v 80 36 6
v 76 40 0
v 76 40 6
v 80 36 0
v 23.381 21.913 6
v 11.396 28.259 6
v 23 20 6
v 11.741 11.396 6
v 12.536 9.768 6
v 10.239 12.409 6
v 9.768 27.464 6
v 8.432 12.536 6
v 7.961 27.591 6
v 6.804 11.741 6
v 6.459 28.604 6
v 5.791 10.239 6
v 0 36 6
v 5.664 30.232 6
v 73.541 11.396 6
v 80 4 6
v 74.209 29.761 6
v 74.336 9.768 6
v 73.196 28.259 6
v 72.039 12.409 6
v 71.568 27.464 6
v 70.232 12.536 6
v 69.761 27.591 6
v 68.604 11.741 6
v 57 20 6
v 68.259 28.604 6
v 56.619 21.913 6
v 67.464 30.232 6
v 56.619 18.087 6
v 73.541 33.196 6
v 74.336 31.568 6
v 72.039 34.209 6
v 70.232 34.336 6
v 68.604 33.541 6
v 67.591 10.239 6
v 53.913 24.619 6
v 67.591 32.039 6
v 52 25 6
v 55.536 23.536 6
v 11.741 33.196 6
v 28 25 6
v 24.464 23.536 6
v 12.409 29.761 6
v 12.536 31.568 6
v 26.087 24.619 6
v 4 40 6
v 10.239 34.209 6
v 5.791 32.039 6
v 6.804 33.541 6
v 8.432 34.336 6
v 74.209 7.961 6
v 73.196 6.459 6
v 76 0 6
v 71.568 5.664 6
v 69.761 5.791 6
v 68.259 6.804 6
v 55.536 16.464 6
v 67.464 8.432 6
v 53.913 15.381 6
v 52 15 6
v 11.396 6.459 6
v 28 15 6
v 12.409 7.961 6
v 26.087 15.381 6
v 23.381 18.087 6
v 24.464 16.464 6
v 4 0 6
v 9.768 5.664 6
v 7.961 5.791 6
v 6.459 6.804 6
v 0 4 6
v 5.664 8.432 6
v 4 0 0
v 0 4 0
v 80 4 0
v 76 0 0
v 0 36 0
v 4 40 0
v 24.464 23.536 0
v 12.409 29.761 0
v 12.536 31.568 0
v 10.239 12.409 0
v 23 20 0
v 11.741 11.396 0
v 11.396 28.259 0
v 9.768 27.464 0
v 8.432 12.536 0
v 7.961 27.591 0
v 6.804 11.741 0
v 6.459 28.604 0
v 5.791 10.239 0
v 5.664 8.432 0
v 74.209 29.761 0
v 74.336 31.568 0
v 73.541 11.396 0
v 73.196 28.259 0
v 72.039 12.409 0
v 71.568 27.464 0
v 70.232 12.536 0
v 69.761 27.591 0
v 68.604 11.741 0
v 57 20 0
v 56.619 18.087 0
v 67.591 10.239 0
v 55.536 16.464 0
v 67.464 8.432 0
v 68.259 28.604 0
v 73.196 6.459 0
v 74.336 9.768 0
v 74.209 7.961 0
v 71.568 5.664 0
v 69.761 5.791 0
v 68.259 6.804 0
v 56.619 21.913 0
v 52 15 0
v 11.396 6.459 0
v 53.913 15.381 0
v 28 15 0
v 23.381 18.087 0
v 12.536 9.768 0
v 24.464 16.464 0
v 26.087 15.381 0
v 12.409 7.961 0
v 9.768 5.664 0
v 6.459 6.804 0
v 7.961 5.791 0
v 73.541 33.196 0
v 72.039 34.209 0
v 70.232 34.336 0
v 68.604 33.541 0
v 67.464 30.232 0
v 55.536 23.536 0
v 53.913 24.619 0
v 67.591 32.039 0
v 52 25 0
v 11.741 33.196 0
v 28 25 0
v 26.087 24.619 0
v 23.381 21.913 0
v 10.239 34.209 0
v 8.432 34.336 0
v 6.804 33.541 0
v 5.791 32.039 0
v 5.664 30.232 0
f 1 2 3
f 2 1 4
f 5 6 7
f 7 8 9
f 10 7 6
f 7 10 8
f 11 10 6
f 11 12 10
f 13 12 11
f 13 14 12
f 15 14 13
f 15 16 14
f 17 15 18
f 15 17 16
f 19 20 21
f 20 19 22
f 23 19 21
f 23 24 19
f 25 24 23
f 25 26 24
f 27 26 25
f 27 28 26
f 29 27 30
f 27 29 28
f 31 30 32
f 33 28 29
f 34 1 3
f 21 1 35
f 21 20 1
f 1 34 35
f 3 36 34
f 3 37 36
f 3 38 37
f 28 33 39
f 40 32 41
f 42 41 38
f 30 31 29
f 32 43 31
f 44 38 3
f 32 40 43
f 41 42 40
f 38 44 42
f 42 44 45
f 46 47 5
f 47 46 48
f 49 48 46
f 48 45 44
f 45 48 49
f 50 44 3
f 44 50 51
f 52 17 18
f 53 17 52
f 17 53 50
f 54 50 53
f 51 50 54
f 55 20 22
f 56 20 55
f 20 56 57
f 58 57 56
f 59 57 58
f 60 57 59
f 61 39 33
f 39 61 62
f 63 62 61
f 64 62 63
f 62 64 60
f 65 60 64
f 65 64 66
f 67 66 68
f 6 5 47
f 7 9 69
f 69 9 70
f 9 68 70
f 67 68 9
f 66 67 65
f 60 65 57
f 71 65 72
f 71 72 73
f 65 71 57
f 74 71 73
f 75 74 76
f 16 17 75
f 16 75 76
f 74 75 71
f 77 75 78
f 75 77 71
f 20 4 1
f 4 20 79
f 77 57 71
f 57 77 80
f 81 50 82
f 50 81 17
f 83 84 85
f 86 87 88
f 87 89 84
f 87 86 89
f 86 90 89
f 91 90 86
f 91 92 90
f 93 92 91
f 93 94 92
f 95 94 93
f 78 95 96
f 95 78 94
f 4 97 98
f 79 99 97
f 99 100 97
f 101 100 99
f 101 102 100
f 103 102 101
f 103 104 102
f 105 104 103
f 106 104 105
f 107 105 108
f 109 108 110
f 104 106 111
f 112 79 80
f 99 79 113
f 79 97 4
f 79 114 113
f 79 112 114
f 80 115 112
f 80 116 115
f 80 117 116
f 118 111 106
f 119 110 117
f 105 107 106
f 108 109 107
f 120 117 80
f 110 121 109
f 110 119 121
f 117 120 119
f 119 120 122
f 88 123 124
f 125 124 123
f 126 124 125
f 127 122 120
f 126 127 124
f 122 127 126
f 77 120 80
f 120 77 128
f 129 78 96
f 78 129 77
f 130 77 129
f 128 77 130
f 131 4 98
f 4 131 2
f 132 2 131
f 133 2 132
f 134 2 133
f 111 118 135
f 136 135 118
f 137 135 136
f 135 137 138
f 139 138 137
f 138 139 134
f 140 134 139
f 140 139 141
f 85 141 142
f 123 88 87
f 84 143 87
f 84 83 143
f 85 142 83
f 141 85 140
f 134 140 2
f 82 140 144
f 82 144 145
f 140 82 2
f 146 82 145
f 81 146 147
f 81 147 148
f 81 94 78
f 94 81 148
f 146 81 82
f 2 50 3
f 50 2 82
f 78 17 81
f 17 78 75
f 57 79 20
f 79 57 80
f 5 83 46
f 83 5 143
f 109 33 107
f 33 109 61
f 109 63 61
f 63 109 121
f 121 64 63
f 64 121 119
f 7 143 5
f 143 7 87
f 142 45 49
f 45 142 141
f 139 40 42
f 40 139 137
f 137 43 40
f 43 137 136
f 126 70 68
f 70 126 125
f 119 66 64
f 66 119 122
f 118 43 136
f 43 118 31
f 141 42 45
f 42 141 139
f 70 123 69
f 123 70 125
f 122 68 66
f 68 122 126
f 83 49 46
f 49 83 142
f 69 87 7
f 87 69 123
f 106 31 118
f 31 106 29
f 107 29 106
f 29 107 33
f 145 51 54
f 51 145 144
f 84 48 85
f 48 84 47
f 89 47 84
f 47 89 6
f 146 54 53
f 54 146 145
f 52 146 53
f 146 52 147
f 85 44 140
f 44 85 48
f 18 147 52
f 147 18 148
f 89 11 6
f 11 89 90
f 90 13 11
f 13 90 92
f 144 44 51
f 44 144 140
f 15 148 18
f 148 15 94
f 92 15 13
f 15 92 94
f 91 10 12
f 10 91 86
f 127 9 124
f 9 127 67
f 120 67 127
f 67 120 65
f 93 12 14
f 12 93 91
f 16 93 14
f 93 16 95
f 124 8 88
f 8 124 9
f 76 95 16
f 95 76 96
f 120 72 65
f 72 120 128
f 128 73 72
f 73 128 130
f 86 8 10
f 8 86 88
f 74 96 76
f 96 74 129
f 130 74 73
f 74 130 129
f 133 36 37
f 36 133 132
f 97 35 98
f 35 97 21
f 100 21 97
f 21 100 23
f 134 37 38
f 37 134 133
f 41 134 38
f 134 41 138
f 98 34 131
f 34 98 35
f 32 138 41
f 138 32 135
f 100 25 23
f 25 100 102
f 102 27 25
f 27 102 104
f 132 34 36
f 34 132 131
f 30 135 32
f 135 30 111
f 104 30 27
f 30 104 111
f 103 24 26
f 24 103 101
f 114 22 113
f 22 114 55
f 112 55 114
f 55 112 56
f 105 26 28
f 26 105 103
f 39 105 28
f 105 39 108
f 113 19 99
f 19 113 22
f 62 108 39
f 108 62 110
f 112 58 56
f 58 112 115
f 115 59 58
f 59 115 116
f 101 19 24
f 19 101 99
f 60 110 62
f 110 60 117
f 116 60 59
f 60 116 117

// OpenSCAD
$fn = 32;

// ----------------------------------------------------------------------
// Bracket plate: slot plate 80 x 40
// ----------------------------------------------------------------------

// --- parameters (mm) ---
hole_r = 3.5;             // bolt hole radius
plate_t = 6;              // plate thickness, Z (extrusion height)
plate_l = 80;             // plate length
plate_w = 40;             // plate width
slot_l = 24;              // slot straight length
slot_r = 5;               // slot end radius
fit_tol = 0.05;           // declared fit tolerance (prompt contract)
free_tol = 0.3;           // declared free tolerance (prompt contract)

slot_len = slot_l + 2 * slot_r;
slot_w = 2 * slot_r;
hole_d2 = 2 * hole_r;

profile = [[4, 0], [76, 0], [80, 4], [80, 36], [76, 40], [4, 40], [0, 36], [0, 4]];  // primary outline, 8 points, counter clockwise
void_1 = [[52, 15], [53.913, 15.381], [55.536, 16.464], [56.619, 18.087], [57, 20], [56.619, 21.913], [55.536, 23.536], [53.913, 24.619], [52, 25], [28, 25], [26.087, 24.619], [24.464, 23.536], [23.381, 21.913], [23, 20], [23.381, 18.087], [24.464, 16.464], [26.087, 15.381], [28, 15]];  // grip slot, 18 points
void_2 = [[12.536, 31.568], [11.741, 33.196], [10.239, 34.209], [8.432, 34.336], [6.804, 33.541], [5.791, 32.039], [5.664, 30.232], [6.459, 28.604], [7.961, 27.591], [9.768, 27.464], [11.396, 28.259], [12.409, 29.761]];  // corner hole, 12 points
void_3 = [[12.536, 9.768], [11.741, 11.396], [10.239, 12.409], [8.432, 12.536], [6.804, 11.741], [5.791, 10.239], [5.664, 8.432], [6.459, 6.804], [7.961, 5.791], [9.768, 5.664], [11.396, 6.459], [12.409, 7.961]];  // corner hole, 12 points
void_4 = [[74.336, 31.568], [73.541, 33.196], [72.039, 34.209], [70.232, 34.336], [68.604, 33.541], [67.591, 32.039], [67.464, 30.232], [68.259, 28.604], [69.761, 27.591], [71.568, 27.464], [73.196, 28.259], [74.209, 29.761]];  // corner hole, 12 points
void_5 = [[74.336, 9.768], [73.541, 11.396], [72.039, 12.409], [70.232, 12.536], [68.604, 11.741], [67.591, 10.239], [67.464, 8.432], [68.259, 6.804], [69.761, 5.791], [71.568, 5.664], [73.196, 6.459], [74.209, 7.961]];  // corner hole, 12 points

// --- the one profile operation ---
difference() {
  linear_extrude(height = plate_t) polygon(points = profile);
  translate([0, 0, -1])
    linear_extrude(height = plate_t + 2) polygon(points = void_1);
  translate([0, 0, -1])
    linear_extrude(height = plate_t + 2) polygon(points = void_2);
  translate([0, 0, -1])
    linear_extrude(height = plate_t + 2) polygon(points = void_3);
  translate([0, 0, -1])
    linear_extrude(height = plate_t + 2) polygon(points = void_4);
  translate([0, 0, -1])
    linear_extrude(height = plate_t + 2) polygon(points = void_5);
}
